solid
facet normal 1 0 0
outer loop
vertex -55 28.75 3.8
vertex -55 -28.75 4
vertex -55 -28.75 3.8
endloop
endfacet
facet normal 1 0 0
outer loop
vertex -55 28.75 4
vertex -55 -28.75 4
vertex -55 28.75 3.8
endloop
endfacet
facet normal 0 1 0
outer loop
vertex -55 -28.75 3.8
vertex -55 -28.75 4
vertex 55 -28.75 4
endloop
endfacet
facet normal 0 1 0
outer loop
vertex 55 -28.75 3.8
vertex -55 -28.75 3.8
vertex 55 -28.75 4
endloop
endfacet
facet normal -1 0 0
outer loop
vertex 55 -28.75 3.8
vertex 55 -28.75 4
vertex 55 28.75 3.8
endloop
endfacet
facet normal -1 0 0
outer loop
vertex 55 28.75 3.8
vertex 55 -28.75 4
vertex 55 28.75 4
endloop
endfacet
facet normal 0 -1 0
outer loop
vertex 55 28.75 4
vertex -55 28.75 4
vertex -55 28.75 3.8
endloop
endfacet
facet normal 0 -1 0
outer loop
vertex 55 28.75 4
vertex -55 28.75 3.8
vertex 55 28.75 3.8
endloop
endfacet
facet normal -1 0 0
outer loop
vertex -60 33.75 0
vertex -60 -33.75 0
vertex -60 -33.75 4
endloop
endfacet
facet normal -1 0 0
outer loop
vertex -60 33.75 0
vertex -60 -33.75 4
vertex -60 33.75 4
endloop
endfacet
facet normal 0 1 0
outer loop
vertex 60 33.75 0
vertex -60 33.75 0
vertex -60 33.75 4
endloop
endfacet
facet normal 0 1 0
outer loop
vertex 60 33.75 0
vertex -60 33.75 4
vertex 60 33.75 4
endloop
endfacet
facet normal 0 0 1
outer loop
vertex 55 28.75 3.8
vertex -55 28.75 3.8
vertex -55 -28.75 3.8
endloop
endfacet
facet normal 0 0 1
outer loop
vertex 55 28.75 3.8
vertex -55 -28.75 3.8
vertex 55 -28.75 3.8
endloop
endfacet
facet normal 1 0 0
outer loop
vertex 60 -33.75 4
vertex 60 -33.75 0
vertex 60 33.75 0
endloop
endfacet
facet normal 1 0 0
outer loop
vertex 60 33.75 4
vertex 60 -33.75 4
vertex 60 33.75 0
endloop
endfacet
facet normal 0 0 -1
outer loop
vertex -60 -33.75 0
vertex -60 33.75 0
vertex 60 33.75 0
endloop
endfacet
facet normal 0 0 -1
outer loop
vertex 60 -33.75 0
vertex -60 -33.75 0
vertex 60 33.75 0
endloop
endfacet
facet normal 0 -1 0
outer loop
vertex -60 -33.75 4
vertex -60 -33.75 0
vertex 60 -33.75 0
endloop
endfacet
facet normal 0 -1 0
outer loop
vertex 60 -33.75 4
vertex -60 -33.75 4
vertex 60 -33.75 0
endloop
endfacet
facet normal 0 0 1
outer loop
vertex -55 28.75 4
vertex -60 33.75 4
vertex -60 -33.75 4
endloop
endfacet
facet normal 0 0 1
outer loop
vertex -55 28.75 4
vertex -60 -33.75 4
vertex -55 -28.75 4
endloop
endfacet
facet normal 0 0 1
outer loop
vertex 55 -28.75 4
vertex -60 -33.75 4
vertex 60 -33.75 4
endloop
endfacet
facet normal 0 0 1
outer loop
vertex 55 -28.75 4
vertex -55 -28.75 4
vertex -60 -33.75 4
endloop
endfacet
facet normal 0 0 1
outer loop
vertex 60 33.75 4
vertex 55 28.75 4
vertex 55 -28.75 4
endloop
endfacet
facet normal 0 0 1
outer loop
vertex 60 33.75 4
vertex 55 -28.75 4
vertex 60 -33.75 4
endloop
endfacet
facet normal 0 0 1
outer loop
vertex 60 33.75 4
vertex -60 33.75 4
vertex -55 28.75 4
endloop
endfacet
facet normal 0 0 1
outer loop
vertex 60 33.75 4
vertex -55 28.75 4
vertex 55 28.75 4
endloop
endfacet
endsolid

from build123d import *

# Parameters (mm, degrees)
F0_W     = 120
F0_H     = 67.5
F0_W_2   = 110.000002
F0_H_2   = 57.500002
F1_DEPTH = 4
F2_W     = 110.000002
F2_H     = 57.500002
F3_DEPTH = 0.2


with BuildPart() as f1:
    # F0 (on Top) → F1 (new body)
    with BuildSketch(Plane.XY):
        Rectangle(F0_W, F0_H)
        Rectangle(F0_W_2, F0_H_2, mode=Mode.SUBTRACT)
        Rectangle(F0_W_2, F0_H_2)
    extrude(amount=F1_DEPTH)

    # F2 (on face) → F3 (cut)
    with BuildSketch(Plane.XY.offset(4)):
        Rectangle(F2_W, F2_H)
    extrude(amount=-F3_DEPTH, mode=Mode.SUBTRACT)


solid = f1.part
